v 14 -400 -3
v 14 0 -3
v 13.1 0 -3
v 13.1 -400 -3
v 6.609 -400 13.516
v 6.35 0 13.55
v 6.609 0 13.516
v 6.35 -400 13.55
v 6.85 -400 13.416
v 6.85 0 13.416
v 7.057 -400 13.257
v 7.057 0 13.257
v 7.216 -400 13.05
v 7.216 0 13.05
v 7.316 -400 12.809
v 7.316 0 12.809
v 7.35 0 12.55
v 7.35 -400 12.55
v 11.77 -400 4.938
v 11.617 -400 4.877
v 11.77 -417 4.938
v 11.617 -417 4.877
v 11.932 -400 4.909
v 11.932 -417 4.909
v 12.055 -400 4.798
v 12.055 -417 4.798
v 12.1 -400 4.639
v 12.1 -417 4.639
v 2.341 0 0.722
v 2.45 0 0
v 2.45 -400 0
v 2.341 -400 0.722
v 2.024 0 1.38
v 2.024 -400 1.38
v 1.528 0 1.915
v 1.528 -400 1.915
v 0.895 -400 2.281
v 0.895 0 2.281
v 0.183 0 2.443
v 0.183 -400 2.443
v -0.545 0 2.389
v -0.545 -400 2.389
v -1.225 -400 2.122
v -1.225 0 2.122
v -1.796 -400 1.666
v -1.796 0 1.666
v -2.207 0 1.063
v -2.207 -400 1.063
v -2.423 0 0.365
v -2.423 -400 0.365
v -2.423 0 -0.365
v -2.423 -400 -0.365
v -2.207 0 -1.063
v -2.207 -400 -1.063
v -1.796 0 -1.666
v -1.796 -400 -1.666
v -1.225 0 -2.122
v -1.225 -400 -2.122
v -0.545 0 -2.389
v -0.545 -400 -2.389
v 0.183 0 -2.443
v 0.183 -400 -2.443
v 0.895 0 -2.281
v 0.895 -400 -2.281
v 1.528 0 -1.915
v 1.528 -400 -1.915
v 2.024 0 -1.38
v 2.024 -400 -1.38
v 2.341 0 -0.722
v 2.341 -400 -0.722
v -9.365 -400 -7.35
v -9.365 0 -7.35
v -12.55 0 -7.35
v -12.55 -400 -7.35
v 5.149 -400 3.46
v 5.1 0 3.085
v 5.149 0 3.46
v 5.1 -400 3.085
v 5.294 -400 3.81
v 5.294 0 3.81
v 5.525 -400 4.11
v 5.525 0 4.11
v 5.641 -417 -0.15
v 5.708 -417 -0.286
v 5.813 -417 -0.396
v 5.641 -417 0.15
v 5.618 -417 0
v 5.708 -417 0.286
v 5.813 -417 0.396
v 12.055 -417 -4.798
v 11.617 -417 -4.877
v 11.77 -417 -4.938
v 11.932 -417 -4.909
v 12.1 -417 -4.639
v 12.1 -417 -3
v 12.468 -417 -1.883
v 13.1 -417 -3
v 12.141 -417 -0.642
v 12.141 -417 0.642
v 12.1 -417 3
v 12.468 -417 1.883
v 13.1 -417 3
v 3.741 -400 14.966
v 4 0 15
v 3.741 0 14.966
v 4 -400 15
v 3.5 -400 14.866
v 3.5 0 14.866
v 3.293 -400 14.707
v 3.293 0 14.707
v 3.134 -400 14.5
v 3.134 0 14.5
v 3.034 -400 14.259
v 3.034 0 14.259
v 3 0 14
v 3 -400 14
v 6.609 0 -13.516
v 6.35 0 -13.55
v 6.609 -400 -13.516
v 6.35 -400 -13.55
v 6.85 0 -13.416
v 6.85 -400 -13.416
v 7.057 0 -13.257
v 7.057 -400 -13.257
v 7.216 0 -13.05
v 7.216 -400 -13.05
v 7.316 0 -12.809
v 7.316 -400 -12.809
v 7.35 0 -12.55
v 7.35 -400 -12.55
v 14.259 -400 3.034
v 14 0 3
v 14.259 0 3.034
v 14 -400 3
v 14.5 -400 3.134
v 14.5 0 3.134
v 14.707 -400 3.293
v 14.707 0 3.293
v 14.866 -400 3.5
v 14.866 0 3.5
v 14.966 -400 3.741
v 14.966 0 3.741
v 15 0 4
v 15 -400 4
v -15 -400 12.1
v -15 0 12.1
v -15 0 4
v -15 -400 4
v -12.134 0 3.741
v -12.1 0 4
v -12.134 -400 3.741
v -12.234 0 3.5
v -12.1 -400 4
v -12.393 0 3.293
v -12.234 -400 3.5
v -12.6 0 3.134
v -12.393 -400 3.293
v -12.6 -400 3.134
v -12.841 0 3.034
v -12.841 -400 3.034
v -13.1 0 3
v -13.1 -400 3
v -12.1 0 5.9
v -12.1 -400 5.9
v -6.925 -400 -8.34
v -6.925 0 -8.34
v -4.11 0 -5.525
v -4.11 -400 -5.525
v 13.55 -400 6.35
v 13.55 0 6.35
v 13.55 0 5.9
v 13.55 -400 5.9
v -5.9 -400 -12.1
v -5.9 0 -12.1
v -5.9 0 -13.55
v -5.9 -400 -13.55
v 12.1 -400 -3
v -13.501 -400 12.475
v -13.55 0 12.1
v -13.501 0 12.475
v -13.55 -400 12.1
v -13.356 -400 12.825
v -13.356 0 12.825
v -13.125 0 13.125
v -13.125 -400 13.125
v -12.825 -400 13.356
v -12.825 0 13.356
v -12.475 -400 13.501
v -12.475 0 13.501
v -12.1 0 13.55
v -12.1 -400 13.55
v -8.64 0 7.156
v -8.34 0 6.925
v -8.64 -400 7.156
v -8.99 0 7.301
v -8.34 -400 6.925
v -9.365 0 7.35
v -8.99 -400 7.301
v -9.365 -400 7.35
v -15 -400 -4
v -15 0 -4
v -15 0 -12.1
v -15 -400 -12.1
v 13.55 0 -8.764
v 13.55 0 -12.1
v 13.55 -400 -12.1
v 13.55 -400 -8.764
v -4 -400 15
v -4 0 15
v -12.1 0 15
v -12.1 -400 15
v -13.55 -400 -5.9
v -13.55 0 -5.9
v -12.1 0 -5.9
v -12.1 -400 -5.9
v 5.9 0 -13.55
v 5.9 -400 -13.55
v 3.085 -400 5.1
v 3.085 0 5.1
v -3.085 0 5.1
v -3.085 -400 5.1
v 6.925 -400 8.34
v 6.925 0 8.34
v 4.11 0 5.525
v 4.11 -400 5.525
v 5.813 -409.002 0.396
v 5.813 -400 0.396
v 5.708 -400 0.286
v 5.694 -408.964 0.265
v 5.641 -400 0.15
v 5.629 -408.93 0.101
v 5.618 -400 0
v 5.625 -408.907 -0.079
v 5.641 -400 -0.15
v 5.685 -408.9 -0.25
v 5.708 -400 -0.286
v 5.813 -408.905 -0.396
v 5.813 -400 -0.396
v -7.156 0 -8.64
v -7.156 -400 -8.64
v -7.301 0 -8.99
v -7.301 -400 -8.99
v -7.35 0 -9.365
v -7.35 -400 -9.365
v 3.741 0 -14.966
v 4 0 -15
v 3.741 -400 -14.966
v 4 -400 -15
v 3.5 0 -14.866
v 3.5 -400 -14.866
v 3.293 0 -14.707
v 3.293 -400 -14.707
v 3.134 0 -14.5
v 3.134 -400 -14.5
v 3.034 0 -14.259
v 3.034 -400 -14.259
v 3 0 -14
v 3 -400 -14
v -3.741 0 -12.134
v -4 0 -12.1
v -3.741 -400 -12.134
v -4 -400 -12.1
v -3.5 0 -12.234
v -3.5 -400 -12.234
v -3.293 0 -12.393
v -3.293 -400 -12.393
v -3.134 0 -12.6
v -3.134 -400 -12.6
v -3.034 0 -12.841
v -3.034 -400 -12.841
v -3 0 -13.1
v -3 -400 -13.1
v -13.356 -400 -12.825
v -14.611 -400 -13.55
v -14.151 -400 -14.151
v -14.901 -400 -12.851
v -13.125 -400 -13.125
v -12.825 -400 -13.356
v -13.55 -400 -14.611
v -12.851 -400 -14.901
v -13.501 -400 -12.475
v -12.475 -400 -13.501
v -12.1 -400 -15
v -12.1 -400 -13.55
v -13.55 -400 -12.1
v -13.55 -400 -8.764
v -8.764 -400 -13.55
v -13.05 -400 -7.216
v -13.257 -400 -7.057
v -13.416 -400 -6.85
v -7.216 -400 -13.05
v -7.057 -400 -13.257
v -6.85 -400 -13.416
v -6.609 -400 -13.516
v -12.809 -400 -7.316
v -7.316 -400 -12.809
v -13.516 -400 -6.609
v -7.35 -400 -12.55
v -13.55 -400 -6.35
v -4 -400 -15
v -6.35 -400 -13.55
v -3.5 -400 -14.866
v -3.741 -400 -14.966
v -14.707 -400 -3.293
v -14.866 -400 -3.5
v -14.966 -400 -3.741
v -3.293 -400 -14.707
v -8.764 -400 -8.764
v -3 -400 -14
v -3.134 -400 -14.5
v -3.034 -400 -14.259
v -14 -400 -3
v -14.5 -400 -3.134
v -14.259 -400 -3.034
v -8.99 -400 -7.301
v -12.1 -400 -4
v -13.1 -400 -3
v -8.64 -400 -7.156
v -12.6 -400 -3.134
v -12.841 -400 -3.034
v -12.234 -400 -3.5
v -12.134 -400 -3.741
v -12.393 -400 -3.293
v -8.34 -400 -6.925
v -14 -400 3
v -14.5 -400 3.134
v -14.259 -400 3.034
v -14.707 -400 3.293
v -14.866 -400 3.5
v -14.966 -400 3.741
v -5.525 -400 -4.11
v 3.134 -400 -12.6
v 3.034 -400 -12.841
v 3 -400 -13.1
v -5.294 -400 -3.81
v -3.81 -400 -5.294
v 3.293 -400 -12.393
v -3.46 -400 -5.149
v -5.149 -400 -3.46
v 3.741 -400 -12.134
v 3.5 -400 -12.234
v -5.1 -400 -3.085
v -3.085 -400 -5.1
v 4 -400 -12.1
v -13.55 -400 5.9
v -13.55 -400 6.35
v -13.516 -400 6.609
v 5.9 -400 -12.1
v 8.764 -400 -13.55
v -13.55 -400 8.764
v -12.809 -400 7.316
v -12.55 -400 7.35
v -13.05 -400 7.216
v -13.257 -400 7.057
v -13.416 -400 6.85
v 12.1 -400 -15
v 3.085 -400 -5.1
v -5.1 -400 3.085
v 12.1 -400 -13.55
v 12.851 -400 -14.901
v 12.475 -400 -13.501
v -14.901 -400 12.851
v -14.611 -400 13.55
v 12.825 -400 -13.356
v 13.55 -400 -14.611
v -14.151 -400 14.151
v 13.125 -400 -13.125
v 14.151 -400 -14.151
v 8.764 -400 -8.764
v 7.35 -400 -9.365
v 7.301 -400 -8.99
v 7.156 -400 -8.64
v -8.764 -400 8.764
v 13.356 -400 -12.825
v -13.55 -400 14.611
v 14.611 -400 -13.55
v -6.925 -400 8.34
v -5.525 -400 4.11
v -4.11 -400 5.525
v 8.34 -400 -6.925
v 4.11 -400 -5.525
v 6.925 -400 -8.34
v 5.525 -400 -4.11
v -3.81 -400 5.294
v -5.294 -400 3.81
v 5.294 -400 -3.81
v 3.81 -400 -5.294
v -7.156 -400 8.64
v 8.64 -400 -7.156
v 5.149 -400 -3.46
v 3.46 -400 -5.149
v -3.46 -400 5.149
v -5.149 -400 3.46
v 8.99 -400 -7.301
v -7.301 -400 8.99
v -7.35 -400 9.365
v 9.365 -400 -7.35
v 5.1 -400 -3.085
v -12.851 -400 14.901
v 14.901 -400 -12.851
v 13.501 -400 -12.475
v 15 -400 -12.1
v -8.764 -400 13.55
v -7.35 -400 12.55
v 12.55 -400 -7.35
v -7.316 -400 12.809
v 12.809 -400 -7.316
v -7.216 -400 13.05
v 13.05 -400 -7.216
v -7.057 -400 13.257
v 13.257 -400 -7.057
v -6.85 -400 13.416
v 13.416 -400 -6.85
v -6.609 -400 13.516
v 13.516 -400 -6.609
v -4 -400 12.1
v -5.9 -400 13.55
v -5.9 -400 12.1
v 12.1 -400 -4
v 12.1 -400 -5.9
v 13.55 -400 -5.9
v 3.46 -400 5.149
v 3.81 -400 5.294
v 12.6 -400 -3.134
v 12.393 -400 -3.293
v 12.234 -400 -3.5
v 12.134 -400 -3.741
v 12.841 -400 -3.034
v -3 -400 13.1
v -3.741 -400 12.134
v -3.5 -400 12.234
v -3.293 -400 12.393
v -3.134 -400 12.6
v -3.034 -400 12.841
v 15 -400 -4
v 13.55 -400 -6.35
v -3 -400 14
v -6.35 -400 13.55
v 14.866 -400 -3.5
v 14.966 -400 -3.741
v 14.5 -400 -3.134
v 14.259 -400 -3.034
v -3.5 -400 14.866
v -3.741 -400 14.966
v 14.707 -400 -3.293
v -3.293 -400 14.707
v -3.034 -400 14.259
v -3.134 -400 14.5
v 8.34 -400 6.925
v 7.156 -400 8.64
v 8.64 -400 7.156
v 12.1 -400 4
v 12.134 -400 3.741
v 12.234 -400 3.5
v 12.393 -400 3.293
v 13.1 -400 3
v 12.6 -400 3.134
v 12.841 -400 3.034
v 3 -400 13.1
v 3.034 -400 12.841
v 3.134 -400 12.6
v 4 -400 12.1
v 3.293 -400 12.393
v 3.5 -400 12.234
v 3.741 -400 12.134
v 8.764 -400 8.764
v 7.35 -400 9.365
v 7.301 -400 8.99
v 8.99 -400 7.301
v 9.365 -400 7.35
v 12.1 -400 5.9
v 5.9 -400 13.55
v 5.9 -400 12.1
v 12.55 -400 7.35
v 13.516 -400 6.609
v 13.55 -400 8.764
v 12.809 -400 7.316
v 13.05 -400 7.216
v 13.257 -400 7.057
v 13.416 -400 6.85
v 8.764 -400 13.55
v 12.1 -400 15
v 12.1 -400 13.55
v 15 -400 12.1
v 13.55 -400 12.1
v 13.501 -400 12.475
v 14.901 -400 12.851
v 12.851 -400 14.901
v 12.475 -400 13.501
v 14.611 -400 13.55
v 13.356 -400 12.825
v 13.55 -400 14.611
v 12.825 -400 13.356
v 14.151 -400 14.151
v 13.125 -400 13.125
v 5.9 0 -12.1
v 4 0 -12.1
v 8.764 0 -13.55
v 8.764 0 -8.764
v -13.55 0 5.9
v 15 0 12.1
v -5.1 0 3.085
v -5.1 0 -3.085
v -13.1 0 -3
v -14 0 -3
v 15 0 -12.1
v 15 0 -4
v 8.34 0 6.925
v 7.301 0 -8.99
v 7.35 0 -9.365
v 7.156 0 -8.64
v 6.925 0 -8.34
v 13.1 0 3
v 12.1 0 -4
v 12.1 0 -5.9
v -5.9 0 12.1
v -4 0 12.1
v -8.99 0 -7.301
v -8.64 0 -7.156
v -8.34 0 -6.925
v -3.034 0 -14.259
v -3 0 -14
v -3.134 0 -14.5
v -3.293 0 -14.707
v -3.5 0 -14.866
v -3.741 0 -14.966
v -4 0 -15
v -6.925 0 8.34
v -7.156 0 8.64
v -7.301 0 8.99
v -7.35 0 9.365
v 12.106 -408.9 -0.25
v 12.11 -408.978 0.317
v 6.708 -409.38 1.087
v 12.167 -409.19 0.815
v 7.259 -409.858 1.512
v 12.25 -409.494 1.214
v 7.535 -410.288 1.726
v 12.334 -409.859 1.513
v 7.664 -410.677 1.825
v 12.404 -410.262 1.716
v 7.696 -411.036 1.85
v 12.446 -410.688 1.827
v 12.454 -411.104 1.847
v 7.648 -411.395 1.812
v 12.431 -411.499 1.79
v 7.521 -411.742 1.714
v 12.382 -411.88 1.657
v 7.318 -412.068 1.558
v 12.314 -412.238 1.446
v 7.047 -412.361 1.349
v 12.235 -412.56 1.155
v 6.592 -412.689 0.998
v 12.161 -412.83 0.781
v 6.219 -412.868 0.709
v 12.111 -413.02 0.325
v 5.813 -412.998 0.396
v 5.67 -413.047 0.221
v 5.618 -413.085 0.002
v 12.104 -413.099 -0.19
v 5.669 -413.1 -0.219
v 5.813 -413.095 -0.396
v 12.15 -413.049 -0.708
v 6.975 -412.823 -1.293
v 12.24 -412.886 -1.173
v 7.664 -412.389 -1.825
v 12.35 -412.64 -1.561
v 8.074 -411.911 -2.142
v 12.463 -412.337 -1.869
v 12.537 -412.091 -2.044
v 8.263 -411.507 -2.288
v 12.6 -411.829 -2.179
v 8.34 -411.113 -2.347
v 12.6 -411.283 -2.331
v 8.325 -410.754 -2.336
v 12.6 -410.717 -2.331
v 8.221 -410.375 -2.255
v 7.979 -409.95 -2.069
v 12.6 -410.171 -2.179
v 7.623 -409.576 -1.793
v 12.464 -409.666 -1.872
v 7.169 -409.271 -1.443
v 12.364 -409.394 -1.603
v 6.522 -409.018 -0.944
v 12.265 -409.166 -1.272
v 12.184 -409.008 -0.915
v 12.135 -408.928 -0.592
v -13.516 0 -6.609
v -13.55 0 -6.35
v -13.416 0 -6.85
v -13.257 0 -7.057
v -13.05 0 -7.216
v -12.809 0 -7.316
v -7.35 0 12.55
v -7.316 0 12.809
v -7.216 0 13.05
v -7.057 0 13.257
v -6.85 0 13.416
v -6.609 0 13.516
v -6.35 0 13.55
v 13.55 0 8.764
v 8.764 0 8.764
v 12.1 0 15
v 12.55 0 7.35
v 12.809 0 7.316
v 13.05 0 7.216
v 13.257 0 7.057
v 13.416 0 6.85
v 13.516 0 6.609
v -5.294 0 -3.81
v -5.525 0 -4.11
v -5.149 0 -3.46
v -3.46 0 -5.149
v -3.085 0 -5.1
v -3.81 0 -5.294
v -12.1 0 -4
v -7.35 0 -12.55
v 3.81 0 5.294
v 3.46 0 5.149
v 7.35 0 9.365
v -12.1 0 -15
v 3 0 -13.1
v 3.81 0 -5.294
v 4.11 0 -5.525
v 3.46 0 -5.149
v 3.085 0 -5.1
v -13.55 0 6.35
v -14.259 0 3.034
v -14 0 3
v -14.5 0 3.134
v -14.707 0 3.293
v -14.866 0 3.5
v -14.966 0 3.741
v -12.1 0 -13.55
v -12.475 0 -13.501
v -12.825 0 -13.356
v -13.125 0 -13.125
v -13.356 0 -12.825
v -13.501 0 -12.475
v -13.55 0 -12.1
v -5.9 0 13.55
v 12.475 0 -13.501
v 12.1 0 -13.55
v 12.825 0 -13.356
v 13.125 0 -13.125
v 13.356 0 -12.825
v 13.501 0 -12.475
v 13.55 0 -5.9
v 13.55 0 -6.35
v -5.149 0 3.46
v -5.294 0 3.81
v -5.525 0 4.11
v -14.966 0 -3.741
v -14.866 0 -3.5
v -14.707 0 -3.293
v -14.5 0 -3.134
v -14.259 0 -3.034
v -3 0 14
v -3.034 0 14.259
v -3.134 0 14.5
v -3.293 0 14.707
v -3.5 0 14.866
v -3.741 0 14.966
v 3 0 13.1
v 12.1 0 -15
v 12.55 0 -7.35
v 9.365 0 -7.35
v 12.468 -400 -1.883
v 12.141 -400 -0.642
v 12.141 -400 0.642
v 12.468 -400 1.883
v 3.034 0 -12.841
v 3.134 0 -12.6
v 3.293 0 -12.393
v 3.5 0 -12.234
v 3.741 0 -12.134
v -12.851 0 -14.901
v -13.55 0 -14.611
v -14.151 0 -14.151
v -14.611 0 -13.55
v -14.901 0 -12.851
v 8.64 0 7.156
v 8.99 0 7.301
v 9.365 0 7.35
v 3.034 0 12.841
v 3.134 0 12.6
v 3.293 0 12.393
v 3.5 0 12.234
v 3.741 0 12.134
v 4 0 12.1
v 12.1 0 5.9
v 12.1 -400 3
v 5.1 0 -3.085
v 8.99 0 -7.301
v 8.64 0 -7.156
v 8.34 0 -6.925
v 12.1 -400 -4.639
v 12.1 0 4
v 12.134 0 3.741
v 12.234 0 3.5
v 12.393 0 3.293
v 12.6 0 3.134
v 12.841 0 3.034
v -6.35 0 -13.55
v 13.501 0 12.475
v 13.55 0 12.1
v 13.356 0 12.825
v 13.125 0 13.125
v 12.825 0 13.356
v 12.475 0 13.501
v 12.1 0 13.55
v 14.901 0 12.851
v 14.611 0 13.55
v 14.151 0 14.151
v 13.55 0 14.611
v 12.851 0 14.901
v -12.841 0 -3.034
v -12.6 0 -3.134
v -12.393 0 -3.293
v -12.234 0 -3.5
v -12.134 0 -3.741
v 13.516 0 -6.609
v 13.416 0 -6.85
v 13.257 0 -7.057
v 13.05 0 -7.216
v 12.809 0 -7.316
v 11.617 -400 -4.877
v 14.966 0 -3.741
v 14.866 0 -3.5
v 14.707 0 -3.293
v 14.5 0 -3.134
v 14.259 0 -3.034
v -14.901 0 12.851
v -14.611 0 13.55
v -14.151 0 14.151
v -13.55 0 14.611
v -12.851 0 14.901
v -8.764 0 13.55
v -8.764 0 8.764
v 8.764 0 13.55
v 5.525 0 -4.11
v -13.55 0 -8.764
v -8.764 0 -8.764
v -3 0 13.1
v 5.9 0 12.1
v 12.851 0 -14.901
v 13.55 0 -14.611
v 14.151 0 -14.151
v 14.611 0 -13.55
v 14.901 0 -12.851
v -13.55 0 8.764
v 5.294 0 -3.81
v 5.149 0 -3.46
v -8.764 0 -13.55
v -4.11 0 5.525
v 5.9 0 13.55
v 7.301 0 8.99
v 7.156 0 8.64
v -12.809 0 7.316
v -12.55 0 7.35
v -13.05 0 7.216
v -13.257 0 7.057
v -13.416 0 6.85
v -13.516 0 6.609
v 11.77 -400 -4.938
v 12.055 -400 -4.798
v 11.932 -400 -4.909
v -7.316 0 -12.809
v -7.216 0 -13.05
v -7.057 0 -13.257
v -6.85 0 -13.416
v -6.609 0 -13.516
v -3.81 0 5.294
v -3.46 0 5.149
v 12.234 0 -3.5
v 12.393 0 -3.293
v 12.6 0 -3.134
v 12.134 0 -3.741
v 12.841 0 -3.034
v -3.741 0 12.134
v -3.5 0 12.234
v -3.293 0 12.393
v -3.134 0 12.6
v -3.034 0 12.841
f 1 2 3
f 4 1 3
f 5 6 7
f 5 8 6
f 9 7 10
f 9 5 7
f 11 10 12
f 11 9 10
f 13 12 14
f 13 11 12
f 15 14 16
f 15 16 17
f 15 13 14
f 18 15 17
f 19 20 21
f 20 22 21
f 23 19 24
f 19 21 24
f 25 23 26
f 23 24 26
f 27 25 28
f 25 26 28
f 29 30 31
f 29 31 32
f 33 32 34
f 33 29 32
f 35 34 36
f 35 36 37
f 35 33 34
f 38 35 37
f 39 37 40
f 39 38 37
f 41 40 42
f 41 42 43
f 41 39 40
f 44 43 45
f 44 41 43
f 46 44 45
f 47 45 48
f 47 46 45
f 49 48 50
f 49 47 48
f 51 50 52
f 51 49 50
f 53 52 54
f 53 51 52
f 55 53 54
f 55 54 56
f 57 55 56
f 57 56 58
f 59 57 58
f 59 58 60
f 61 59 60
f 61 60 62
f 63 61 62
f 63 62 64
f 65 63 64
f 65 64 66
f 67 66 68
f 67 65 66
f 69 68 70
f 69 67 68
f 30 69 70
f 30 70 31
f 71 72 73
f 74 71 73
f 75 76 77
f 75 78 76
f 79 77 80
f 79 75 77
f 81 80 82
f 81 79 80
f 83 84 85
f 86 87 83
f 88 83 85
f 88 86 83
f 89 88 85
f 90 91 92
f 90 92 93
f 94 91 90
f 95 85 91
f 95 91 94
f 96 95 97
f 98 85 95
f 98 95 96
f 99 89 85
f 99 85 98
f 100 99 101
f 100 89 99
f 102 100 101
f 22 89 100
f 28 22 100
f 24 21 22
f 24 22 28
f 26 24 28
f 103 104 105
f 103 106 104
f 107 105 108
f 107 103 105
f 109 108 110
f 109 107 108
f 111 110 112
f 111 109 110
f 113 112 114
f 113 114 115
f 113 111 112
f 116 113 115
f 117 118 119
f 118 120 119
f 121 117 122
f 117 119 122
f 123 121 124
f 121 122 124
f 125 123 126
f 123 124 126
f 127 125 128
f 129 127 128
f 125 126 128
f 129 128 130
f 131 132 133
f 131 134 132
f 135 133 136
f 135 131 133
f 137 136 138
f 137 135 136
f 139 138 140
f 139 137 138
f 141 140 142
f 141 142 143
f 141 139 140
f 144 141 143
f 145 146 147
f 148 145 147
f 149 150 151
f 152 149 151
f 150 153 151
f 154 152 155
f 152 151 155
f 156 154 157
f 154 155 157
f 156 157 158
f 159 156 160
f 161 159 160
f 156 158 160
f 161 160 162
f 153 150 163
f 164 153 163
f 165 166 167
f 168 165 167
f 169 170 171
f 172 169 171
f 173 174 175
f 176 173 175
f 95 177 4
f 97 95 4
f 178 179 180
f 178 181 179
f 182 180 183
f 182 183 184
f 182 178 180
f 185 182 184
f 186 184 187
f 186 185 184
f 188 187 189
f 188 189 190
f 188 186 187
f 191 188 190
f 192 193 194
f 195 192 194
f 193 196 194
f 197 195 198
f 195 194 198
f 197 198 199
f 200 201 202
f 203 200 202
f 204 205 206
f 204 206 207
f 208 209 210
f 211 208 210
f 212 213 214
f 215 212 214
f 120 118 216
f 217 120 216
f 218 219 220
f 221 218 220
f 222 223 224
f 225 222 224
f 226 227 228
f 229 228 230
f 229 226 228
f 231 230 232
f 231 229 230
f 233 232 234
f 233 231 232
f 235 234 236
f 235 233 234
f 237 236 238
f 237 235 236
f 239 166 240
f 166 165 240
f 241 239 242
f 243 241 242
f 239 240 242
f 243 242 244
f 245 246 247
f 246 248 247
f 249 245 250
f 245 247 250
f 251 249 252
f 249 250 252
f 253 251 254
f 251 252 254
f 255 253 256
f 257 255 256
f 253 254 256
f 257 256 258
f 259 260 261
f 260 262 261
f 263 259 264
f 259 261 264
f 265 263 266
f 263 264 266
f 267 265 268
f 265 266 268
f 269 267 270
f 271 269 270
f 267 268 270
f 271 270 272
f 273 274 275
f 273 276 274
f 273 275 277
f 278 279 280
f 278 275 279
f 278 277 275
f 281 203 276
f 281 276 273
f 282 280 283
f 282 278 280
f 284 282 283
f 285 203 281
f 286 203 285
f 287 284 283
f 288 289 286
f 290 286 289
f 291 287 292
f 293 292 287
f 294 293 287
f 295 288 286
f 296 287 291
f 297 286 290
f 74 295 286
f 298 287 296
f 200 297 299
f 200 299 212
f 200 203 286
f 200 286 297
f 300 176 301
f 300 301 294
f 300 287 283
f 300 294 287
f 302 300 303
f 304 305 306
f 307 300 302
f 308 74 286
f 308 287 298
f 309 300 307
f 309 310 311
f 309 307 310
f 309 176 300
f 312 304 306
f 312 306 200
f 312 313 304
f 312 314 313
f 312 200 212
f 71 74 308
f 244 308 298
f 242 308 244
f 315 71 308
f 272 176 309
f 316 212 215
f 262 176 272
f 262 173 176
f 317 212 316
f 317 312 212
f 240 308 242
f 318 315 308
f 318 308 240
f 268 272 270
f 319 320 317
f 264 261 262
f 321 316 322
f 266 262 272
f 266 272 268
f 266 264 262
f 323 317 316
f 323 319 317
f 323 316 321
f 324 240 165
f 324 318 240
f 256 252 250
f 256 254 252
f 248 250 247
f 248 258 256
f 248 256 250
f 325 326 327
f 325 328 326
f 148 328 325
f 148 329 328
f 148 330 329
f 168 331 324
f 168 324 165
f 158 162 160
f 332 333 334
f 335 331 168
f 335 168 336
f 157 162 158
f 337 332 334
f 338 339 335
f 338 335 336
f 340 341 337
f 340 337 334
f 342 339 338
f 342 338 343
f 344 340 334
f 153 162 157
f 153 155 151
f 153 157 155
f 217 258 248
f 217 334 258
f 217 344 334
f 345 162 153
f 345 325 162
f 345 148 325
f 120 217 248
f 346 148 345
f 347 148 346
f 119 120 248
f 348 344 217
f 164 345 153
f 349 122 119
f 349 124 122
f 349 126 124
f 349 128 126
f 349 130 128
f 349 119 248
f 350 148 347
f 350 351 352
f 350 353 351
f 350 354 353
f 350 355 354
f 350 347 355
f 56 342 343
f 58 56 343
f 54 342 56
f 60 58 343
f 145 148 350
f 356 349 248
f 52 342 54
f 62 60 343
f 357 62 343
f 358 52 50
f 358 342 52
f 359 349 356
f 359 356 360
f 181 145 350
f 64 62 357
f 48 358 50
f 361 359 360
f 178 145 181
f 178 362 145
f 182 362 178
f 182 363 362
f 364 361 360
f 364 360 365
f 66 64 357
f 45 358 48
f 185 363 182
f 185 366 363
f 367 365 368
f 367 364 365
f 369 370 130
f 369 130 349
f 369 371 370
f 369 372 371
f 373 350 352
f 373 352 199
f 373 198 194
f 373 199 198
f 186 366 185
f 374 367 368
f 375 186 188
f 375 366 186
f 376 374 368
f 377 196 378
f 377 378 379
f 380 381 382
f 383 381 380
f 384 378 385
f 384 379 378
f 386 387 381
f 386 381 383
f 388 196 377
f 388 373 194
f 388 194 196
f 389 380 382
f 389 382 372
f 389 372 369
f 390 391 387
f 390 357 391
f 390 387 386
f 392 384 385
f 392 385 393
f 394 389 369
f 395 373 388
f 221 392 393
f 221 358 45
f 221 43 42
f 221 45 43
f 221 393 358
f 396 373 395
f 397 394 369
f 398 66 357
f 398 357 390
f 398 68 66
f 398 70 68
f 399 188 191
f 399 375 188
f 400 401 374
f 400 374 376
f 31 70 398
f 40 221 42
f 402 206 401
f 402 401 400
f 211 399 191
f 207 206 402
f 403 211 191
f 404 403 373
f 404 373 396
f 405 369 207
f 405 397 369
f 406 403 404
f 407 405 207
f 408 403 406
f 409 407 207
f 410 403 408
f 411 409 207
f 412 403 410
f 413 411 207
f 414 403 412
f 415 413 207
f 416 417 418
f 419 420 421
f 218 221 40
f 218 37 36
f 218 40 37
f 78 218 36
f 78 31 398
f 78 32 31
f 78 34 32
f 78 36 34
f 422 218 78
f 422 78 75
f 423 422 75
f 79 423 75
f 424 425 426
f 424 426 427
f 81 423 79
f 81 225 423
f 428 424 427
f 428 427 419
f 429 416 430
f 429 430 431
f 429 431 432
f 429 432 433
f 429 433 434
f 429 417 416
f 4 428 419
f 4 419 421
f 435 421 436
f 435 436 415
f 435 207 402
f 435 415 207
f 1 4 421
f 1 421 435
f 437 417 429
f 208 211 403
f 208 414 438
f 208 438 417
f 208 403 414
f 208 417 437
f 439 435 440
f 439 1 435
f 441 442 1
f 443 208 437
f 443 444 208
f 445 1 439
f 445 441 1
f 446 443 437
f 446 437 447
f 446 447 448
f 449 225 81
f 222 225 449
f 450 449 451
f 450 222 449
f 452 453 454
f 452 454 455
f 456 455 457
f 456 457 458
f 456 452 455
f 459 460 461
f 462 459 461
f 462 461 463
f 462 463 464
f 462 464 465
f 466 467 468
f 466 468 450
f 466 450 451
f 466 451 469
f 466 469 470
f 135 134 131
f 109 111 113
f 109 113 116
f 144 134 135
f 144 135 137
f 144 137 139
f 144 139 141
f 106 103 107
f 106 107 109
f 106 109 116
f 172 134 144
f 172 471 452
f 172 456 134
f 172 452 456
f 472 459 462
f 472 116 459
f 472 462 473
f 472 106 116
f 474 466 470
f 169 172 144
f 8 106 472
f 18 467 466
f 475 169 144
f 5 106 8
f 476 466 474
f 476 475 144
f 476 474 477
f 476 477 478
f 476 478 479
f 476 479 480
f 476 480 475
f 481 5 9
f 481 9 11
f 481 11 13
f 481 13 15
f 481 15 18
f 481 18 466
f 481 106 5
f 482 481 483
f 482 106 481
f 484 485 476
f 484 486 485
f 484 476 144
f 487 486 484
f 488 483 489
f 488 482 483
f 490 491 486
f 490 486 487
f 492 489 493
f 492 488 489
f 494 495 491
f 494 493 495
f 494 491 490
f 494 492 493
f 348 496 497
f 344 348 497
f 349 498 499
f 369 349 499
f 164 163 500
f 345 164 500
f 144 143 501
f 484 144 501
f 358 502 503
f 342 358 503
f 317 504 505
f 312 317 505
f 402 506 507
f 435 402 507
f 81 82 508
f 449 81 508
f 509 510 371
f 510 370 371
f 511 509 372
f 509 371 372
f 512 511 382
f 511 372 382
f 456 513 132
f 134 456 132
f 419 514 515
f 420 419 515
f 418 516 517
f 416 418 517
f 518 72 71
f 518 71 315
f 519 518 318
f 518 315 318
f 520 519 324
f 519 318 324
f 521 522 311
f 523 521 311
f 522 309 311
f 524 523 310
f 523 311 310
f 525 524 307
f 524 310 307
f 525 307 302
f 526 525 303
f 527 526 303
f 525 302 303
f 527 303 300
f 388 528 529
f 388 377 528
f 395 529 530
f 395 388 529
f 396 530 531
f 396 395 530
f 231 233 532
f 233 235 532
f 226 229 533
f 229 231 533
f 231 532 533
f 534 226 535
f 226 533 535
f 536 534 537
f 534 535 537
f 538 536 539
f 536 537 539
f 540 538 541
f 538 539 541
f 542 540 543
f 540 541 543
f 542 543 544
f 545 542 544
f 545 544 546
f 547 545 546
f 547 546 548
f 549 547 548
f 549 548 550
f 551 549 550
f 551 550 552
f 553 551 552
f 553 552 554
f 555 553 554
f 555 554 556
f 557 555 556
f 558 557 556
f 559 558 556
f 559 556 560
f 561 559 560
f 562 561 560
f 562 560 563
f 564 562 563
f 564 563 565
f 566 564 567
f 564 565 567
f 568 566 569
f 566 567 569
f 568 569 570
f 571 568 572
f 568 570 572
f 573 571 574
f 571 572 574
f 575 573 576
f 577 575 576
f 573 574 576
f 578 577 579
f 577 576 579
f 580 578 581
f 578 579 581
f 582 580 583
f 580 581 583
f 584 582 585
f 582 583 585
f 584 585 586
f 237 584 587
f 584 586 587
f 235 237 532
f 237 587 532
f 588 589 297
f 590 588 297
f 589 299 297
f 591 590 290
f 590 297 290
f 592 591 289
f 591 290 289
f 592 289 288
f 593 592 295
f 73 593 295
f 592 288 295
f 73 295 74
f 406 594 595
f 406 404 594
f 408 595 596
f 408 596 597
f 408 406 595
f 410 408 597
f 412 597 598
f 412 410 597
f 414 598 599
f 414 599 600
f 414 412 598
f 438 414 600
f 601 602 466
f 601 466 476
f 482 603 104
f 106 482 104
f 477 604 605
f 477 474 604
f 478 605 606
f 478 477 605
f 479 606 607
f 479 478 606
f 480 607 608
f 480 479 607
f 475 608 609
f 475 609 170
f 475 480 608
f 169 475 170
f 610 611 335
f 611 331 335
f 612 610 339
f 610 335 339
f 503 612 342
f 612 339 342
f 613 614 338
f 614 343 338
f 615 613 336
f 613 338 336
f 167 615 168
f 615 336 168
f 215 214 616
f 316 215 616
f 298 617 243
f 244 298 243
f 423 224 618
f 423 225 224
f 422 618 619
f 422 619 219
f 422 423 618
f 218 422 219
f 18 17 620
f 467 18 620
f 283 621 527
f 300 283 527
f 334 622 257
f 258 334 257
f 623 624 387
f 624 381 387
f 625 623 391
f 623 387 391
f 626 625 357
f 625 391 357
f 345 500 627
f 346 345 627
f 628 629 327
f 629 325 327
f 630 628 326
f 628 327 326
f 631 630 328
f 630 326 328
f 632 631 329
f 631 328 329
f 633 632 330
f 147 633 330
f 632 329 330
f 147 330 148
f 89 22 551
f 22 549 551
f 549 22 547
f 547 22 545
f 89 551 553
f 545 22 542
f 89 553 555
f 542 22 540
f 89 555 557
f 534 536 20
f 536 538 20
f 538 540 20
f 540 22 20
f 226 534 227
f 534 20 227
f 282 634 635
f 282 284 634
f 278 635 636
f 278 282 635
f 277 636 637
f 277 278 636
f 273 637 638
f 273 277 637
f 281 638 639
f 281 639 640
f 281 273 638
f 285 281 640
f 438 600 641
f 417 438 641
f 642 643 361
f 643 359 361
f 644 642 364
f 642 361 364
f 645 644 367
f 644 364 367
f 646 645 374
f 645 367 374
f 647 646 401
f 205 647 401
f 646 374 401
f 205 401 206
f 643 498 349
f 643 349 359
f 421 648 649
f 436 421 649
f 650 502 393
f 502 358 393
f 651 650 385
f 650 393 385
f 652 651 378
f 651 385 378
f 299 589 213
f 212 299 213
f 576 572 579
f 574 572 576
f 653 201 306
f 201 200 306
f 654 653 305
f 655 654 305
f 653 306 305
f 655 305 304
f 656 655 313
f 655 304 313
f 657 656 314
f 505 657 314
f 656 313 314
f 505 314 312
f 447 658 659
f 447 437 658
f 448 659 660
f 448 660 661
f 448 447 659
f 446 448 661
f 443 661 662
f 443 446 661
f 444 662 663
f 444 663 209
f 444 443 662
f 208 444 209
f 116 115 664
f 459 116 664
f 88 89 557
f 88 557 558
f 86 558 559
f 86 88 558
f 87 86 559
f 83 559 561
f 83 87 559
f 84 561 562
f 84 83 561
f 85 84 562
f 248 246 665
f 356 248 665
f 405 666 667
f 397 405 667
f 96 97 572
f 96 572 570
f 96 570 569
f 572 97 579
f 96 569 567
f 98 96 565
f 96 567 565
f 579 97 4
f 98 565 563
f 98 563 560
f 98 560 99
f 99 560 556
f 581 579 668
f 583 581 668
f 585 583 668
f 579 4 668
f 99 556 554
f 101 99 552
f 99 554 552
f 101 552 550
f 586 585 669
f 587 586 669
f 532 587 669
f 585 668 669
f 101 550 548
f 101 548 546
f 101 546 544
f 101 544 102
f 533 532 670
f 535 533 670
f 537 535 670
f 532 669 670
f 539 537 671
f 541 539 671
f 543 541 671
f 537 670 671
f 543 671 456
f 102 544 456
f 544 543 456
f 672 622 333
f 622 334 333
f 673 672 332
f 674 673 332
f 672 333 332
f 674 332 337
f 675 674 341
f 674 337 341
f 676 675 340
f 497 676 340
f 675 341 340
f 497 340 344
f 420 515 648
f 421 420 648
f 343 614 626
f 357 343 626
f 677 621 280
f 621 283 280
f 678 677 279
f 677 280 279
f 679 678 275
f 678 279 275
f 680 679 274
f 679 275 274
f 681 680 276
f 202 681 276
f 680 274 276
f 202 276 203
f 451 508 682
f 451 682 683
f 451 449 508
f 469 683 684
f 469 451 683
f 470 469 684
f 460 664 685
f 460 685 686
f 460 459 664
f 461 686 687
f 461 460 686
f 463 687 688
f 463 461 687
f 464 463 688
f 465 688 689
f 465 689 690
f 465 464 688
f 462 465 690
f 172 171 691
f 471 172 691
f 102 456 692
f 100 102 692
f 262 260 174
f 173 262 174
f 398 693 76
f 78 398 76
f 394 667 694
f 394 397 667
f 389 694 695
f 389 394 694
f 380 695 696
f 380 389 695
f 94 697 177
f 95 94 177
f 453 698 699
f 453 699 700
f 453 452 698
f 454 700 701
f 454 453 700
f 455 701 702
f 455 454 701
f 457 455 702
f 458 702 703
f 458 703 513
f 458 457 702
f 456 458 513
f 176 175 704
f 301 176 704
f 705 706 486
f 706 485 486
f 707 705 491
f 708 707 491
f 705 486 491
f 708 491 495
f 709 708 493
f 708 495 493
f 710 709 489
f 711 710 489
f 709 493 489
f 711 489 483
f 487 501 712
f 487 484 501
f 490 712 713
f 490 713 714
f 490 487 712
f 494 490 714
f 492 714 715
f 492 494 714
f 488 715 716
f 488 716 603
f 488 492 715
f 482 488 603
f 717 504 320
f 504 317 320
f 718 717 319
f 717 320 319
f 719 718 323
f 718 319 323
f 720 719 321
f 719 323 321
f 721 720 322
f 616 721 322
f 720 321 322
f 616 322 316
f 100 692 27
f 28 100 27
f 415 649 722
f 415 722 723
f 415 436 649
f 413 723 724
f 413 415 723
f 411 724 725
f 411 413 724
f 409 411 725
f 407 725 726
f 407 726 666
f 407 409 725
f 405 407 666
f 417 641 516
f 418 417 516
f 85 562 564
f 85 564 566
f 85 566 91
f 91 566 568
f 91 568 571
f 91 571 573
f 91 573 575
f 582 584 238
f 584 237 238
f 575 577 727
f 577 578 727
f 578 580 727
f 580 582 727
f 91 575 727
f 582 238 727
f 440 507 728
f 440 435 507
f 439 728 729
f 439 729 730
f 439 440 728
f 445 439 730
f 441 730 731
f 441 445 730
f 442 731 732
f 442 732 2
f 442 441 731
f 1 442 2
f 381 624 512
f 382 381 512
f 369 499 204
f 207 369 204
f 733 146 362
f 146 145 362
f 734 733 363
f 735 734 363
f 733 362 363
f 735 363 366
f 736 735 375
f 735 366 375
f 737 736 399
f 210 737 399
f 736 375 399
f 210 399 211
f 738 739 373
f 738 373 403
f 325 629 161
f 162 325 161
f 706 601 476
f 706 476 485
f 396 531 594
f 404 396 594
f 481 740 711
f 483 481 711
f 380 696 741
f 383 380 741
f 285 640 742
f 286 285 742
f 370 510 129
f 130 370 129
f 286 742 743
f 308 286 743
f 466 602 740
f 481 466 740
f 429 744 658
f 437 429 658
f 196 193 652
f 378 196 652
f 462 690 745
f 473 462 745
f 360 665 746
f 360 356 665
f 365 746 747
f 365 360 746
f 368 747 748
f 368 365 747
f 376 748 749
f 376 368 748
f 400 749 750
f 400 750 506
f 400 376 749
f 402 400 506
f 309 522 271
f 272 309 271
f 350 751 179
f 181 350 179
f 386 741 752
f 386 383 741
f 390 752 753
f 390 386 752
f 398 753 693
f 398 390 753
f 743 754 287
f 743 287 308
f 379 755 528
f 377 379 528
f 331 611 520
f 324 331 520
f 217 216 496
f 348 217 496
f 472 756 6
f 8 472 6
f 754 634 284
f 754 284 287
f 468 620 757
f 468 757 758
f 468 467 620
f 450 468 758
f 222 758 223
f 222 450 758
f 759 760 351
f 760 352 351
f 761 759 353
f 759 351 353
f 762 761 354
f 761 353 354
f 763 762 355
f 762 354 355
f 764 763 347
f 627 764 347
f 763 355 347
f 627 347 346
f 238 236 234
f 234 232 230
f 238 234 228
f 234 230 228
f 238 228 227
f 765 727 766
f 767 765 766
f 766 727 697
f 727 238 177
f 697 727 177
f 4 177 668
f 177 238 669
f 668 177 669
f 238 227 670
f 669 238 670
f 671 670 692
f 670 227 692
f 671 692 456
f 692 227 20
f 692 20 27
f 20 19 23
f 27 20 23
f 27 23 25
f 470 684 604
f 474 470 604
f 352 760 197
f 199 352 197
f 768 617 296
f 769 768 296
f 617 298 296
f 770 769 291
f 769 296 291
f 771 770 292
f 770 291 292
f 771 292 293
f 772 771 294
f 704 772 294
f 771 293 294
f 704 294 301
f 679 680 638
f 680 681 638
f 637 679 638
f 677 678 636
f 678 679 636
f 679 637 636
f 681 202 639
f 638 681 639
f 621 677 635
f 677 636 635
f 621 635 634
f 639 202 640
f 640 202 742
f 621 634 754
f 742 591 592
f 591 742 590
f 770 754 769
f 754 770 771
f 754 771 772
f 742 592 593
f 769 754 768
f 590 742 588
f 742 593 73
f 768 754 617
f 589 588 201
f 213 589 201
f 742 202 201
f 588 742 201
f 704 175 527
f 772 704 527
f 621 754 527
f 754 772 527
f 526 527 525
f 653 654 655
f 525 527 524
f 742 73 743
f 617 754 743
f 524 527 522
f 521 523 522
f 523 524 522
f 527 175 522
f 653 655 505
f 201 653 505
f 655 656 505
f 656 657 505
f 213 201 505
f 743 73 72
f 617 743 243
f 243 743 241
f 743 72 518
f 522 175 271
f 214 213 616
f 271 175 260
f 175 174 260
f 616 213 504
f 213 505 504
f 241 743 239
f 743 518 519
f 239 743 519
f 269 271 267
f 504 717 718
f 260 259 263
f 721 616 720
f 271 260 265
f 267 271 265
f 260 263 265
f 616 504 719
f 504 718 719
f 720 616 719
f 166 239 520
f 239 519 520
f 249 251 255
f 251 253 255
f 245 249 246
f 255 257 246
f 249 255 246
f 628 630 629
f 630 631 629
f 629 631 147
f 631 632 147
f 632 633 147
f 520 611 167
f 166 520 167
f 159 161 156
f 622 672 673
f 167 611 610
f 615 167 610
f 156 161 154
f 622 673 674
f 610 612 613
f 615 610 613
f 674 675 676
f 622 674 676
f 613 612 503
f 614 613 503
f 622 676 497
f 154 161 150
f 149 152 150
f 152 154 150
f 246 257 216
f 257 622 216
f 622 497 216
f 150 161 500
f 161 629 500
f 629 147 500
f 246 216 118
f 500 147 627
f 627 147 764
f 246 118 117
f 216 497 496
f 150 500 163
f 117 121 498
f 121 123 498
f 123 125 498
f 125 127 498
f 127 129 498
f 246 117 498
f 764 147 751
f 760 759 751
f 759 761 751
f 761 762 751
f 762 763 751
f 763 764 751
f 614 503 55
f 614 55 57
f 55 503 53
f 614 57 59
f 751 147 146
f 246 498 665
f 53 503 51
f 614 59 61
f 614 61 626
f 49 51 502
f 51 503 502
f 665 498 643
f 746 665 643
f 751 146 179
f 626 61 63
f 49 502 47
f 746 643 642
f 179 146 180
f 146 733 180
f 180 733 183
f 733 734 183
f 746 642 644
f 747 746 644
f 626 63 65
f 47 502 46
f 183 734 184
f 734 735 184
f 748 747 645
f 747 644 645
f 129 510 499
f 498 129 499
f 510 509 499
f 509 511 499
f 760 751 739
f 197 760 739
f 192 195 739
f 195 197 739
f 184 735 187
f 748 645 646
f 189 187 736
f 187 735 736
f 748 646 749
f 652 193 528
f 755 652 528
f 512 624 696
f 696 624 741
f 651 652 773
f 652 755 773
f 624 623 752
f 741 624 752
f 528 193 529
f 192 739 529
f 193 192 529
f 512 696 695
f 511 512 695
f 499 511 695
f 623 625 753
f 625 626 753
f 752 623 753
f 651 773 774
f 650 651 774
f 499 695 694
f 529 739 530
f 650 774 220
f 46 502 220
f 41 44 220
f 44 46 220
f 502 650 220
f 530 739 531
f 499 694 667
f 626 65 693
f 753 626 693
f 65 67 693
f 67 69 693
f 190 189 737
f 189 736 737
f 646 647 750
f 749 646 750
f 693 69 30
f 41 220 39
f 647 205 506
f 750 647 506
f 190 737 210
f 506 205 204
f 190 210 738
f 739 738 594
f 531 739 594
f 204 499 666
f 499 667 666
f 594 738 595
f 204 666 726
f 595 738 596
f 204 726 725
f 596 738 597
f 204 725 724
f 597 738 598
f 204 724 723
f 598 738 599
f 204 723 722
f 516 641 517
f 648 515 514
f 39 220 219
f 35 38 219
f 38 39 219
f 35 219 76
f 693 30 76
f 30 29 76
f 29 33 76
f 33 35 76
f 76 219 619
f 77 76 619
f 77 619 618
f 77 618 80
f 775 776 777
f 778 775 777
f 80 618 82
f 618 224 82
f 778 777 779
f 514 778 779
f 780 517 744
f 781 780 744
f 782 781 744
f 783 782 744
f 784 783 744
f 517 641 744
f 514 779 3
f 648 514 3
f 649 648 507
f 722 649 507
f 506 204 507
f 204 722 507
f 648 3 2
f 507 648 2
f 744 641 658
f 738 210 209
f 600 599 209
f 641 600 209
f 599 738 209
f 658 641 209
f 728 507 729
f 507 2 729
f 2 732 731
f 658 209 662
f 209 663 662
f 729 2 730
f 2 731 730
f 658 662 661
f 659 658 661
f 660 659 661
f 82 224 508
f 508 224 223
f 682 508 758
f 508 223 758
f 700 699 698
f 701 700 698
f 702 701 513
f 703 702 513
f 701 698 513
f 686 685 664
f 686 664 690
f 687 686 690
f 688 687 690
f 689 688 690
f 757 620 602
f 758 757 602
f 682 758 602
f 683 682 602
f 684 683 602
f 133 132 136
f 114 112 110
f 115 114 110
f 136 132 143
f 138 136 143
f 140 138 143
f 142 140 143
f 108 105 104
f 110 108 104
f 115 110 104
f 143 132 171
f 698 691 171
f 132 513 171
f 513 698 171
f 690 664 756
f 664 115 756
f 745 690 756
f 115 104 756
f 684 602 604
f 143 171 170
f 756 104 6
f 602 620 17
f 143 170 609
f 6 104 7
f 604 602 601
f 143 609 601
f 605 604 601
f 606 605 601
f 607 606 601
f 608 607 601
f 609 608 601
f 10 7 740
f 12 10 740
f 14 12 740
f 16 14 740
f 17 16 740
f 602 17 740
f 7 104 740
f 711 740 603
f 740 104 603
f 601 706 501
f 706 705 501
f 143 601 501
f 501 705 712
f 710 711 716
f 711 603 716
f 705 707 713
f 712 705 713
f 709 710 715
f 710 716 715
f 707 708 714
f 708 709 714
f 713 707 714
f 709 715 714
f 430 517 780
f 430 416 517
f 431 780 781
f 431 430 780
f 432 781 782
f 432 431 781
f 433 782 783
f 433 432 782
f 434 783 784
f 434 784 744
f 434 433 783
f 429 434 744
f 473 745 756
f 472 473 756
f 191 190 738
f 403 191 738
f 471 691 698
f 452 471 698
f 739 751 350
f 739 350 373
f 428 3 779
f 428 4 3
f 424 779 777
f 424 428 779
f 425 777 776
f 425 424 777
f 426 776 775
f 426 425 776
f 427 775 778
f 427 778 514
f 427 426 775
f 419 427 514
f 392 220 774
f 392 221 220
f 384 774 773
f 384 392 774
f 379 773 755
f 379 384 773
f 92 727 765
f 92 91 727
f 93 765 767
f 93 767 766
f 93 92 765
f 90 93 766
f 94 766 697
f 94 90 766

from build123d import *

# Parameters (mm, degrees)
F0_W      = 4.7857864376
F0_H      = 4.7857864376
F0_R      = 2.45
F1_DEPTH  = 400
F2_R      = 1
F3_R      = 2.9
F4_R      = 1.45
F6_DEPTH  = 17
F7_R      = 0.5
F8_R      = 0.3
F11_D     = 4.2
F11_DEPTH = 6.9828249388


with BuildPart() as f1:
    # F0 (on Front) → F1 (new body)
    with BuildSketch(Plane.XZ):
        Polygon((3, -15), (15, -15), (15, -3), (12.1, -3), (12.1, -5.9), (13.55, -5.9), (13.55, -7.35), (8.7642135624, -7.35), (5.1, -3.6857864376), (5.1, 0), (5.1, 3.6857864376), (8.7642135624, 7.35), (13.55, 7.35), (13.55, 5.9), (12.1, 5.9), (12.1, 3), (15, 3), (15, 15), (3, 15), (3, 12.1), (5.9, 12.1), (5.9, 13.55), (7.35, 13.55), (7.35, 8.7642135624), (3.6857864376, 5.1), (0, 5.1), (-3.6857864376, 5.1), (-7.35, 8.7642135624), (-7.35, 13.55), (-5.9, 13.55), (-5.9, 12.1), (-3, 12.1), (-3, 15), (-15, 15), (-15, 3), (-12.1, 3), (-12.1, 5.9), (-13.55, 5.9), (-13.55, 7.35), (-8.7642135624, 7.35), (-5.1, 3.6857864376), (-5.1, 0), (-5.1, -3.6857864376), (-8.7642135624, -7.35), (-13.55, -7.35), (-13.55, -5.9), (-12.1, -5.9), (-12.1, -3), (-15, -3), (-15, -15), (-3, -15), (-3, -12.1), (-5.9, -12.1), (-5.9, -13.55), (-7.35, -13.55), (-7.35, -8.7642135624), (-3.6857864376, -5.1), (0, -5.1), (3.6857864376, -5.1), (7.35, -8.7642135624), (7.35, -13.55), (5.9, -13.55), (5.9, -12.1), (3, -12.1), align=None)
        with Locations((-11.1571067812, -11.1571067812)):
            Rectangle(F0_W, F0_H, mode=Mode.SUBTRACT)
        with Locations((11.1571067812, -11.1571067812)):
            Rectangle(F0_W, F0_H, mode=Mode.SUBTRACT)
        with Locations((-11.1571067812, 11.1571067812)):
            Rectangle(F0_W, F0_H, mode=Mode.SUBTRACT)
        Circle(F0_R, mode=Mode.SUBTRACT)
        with Locations((11.1571067812, 11.1571067812)):
            Rectangle(F0_W, F0_H, mode=Mode.SUBTRACT)
    extrude(amount=F1_DEPTH)

    # F2
    f2_edges = [f1.edges().sort_by_distance(p)[0] for p in [
        (12.1, -200, -3),
        (15, -200, -3),
        (12.1, -200, 3),
        (15, -200, 3),
        (3, -200, -15),
        (3, -200, -12.1),
        (-3, -200, -15),
        (-3, -200, -12.1),
        (-15, -200, -3),
        (-12.1, -200, -3),
        (-12.1, -200, 3),
        (-15, -200, 3),
        (-3, -200, 12.1),
        (-3, -200, 15),
        (3, -200, 12.1),
        (3, -200, 15),
        (-13.55, -200, 7.35),
        (-7.35, -200, 13.55),
        (7.35, -200, 13.55),
        (13.55, -200, 7.35),
        (7.35, -200, -13.55),
        (13.55, -200, -7.35),
        (-7.35, -200, -13.55),
        (-13.55, -200, -7.35),
    ]]
    fillet(f2_edges, radius=F2_R)

    # F3
    f3_edges = [f1.edges().sort_by_distance(p)[0] for p in [
        (15, -200, 15),
        (-15, -200, 15),
        (-15, -200, -15),
        (15, -200, -15),
    ]]
    fillet(f3_edges, radius=F3_R)

    # F4
    f4_edges = [f1.edges().sort_by_distance(p)[0] for p in [
        (13.55, -200, -13.55),
        (-13.55, -200, -13.55),
        (-13.55, -200, 13.55),
        (13.55, -200, 13.55),
        (-7.35, -200, -8.764214),
        (-3.685786, -200, -5.1),
        (3.685786, -200, -5.1),
        (7.35, -200, -8.764214),
        (8.764214, -200, -7.35),
        (5.1, -200, -3.685786),
        (5.1, -200, 3.685786),
        (8.764214, -200, 7.35),
        (-7.35, -200, 8.764214),
        (-3.685786, -200, 5.1),
        (3.685786, -200, 5.1),
        (7.35, -200, 8.764214),
        (-8.764214, -200, 7.35),
        (-5.1, -200, 3.685786),
        (-5.1, -200, -3.685786),
        (-8.764214, -200, -7.35),
    ]]
    fillet(f4_edges, radius=F4_R)


with BuildPart() as f6:
    # F5 (on face) → F6 (new body)
    with BuildSketch(Plane.XZ.offset(400)):
        with BuildLine():
            Line((13.1, 3), (12.1, 3))
            Line((12.1, 3), (12.1, 4))
            Line((12.1, 4), (12.1, 5.25))
            Line((12.1, 5.25), (5.3, 0))
            Line((5.3, 0), (12.1, -5.25))
            Line((12.1, -5.25), (12.1, -4))
            Line((12.1, -4), (12.1, -3))
            Line((12.1, -3), (13.1, -3))
            ThreePointArc((13.1, -3), (12.1, 0), (13.1, 3))
        make_face()
    extrude(amount=F6_DEPTH)

    # F7
    f7_edges = [f6.edges().sort_by_distance(p)[0] for p in [
        (5.3, -408.5, 0),
    ]]
    fillet(f7_edges, radius=F7_R)

    # F8
    f8_edges = [f6.edges().sort_by_distance(p)[0] for p in [
        (12.1, -408.5, 5.25),
        (12.1, -408.5, -5.25),
    ]]
    fillet(f8_edges, radius=F8_R)

    # F11 (through all, one way)
    with BuildSketch(Plane.YZ.offset(12.6)):
        with Locations((-411, -0.25)):
            Circle(F11_D / 2)
    extrude(amount=-F11_DEPTH, mode=Mode.SUBTRACT)


solid = Compound([f1.part, f6.part])
